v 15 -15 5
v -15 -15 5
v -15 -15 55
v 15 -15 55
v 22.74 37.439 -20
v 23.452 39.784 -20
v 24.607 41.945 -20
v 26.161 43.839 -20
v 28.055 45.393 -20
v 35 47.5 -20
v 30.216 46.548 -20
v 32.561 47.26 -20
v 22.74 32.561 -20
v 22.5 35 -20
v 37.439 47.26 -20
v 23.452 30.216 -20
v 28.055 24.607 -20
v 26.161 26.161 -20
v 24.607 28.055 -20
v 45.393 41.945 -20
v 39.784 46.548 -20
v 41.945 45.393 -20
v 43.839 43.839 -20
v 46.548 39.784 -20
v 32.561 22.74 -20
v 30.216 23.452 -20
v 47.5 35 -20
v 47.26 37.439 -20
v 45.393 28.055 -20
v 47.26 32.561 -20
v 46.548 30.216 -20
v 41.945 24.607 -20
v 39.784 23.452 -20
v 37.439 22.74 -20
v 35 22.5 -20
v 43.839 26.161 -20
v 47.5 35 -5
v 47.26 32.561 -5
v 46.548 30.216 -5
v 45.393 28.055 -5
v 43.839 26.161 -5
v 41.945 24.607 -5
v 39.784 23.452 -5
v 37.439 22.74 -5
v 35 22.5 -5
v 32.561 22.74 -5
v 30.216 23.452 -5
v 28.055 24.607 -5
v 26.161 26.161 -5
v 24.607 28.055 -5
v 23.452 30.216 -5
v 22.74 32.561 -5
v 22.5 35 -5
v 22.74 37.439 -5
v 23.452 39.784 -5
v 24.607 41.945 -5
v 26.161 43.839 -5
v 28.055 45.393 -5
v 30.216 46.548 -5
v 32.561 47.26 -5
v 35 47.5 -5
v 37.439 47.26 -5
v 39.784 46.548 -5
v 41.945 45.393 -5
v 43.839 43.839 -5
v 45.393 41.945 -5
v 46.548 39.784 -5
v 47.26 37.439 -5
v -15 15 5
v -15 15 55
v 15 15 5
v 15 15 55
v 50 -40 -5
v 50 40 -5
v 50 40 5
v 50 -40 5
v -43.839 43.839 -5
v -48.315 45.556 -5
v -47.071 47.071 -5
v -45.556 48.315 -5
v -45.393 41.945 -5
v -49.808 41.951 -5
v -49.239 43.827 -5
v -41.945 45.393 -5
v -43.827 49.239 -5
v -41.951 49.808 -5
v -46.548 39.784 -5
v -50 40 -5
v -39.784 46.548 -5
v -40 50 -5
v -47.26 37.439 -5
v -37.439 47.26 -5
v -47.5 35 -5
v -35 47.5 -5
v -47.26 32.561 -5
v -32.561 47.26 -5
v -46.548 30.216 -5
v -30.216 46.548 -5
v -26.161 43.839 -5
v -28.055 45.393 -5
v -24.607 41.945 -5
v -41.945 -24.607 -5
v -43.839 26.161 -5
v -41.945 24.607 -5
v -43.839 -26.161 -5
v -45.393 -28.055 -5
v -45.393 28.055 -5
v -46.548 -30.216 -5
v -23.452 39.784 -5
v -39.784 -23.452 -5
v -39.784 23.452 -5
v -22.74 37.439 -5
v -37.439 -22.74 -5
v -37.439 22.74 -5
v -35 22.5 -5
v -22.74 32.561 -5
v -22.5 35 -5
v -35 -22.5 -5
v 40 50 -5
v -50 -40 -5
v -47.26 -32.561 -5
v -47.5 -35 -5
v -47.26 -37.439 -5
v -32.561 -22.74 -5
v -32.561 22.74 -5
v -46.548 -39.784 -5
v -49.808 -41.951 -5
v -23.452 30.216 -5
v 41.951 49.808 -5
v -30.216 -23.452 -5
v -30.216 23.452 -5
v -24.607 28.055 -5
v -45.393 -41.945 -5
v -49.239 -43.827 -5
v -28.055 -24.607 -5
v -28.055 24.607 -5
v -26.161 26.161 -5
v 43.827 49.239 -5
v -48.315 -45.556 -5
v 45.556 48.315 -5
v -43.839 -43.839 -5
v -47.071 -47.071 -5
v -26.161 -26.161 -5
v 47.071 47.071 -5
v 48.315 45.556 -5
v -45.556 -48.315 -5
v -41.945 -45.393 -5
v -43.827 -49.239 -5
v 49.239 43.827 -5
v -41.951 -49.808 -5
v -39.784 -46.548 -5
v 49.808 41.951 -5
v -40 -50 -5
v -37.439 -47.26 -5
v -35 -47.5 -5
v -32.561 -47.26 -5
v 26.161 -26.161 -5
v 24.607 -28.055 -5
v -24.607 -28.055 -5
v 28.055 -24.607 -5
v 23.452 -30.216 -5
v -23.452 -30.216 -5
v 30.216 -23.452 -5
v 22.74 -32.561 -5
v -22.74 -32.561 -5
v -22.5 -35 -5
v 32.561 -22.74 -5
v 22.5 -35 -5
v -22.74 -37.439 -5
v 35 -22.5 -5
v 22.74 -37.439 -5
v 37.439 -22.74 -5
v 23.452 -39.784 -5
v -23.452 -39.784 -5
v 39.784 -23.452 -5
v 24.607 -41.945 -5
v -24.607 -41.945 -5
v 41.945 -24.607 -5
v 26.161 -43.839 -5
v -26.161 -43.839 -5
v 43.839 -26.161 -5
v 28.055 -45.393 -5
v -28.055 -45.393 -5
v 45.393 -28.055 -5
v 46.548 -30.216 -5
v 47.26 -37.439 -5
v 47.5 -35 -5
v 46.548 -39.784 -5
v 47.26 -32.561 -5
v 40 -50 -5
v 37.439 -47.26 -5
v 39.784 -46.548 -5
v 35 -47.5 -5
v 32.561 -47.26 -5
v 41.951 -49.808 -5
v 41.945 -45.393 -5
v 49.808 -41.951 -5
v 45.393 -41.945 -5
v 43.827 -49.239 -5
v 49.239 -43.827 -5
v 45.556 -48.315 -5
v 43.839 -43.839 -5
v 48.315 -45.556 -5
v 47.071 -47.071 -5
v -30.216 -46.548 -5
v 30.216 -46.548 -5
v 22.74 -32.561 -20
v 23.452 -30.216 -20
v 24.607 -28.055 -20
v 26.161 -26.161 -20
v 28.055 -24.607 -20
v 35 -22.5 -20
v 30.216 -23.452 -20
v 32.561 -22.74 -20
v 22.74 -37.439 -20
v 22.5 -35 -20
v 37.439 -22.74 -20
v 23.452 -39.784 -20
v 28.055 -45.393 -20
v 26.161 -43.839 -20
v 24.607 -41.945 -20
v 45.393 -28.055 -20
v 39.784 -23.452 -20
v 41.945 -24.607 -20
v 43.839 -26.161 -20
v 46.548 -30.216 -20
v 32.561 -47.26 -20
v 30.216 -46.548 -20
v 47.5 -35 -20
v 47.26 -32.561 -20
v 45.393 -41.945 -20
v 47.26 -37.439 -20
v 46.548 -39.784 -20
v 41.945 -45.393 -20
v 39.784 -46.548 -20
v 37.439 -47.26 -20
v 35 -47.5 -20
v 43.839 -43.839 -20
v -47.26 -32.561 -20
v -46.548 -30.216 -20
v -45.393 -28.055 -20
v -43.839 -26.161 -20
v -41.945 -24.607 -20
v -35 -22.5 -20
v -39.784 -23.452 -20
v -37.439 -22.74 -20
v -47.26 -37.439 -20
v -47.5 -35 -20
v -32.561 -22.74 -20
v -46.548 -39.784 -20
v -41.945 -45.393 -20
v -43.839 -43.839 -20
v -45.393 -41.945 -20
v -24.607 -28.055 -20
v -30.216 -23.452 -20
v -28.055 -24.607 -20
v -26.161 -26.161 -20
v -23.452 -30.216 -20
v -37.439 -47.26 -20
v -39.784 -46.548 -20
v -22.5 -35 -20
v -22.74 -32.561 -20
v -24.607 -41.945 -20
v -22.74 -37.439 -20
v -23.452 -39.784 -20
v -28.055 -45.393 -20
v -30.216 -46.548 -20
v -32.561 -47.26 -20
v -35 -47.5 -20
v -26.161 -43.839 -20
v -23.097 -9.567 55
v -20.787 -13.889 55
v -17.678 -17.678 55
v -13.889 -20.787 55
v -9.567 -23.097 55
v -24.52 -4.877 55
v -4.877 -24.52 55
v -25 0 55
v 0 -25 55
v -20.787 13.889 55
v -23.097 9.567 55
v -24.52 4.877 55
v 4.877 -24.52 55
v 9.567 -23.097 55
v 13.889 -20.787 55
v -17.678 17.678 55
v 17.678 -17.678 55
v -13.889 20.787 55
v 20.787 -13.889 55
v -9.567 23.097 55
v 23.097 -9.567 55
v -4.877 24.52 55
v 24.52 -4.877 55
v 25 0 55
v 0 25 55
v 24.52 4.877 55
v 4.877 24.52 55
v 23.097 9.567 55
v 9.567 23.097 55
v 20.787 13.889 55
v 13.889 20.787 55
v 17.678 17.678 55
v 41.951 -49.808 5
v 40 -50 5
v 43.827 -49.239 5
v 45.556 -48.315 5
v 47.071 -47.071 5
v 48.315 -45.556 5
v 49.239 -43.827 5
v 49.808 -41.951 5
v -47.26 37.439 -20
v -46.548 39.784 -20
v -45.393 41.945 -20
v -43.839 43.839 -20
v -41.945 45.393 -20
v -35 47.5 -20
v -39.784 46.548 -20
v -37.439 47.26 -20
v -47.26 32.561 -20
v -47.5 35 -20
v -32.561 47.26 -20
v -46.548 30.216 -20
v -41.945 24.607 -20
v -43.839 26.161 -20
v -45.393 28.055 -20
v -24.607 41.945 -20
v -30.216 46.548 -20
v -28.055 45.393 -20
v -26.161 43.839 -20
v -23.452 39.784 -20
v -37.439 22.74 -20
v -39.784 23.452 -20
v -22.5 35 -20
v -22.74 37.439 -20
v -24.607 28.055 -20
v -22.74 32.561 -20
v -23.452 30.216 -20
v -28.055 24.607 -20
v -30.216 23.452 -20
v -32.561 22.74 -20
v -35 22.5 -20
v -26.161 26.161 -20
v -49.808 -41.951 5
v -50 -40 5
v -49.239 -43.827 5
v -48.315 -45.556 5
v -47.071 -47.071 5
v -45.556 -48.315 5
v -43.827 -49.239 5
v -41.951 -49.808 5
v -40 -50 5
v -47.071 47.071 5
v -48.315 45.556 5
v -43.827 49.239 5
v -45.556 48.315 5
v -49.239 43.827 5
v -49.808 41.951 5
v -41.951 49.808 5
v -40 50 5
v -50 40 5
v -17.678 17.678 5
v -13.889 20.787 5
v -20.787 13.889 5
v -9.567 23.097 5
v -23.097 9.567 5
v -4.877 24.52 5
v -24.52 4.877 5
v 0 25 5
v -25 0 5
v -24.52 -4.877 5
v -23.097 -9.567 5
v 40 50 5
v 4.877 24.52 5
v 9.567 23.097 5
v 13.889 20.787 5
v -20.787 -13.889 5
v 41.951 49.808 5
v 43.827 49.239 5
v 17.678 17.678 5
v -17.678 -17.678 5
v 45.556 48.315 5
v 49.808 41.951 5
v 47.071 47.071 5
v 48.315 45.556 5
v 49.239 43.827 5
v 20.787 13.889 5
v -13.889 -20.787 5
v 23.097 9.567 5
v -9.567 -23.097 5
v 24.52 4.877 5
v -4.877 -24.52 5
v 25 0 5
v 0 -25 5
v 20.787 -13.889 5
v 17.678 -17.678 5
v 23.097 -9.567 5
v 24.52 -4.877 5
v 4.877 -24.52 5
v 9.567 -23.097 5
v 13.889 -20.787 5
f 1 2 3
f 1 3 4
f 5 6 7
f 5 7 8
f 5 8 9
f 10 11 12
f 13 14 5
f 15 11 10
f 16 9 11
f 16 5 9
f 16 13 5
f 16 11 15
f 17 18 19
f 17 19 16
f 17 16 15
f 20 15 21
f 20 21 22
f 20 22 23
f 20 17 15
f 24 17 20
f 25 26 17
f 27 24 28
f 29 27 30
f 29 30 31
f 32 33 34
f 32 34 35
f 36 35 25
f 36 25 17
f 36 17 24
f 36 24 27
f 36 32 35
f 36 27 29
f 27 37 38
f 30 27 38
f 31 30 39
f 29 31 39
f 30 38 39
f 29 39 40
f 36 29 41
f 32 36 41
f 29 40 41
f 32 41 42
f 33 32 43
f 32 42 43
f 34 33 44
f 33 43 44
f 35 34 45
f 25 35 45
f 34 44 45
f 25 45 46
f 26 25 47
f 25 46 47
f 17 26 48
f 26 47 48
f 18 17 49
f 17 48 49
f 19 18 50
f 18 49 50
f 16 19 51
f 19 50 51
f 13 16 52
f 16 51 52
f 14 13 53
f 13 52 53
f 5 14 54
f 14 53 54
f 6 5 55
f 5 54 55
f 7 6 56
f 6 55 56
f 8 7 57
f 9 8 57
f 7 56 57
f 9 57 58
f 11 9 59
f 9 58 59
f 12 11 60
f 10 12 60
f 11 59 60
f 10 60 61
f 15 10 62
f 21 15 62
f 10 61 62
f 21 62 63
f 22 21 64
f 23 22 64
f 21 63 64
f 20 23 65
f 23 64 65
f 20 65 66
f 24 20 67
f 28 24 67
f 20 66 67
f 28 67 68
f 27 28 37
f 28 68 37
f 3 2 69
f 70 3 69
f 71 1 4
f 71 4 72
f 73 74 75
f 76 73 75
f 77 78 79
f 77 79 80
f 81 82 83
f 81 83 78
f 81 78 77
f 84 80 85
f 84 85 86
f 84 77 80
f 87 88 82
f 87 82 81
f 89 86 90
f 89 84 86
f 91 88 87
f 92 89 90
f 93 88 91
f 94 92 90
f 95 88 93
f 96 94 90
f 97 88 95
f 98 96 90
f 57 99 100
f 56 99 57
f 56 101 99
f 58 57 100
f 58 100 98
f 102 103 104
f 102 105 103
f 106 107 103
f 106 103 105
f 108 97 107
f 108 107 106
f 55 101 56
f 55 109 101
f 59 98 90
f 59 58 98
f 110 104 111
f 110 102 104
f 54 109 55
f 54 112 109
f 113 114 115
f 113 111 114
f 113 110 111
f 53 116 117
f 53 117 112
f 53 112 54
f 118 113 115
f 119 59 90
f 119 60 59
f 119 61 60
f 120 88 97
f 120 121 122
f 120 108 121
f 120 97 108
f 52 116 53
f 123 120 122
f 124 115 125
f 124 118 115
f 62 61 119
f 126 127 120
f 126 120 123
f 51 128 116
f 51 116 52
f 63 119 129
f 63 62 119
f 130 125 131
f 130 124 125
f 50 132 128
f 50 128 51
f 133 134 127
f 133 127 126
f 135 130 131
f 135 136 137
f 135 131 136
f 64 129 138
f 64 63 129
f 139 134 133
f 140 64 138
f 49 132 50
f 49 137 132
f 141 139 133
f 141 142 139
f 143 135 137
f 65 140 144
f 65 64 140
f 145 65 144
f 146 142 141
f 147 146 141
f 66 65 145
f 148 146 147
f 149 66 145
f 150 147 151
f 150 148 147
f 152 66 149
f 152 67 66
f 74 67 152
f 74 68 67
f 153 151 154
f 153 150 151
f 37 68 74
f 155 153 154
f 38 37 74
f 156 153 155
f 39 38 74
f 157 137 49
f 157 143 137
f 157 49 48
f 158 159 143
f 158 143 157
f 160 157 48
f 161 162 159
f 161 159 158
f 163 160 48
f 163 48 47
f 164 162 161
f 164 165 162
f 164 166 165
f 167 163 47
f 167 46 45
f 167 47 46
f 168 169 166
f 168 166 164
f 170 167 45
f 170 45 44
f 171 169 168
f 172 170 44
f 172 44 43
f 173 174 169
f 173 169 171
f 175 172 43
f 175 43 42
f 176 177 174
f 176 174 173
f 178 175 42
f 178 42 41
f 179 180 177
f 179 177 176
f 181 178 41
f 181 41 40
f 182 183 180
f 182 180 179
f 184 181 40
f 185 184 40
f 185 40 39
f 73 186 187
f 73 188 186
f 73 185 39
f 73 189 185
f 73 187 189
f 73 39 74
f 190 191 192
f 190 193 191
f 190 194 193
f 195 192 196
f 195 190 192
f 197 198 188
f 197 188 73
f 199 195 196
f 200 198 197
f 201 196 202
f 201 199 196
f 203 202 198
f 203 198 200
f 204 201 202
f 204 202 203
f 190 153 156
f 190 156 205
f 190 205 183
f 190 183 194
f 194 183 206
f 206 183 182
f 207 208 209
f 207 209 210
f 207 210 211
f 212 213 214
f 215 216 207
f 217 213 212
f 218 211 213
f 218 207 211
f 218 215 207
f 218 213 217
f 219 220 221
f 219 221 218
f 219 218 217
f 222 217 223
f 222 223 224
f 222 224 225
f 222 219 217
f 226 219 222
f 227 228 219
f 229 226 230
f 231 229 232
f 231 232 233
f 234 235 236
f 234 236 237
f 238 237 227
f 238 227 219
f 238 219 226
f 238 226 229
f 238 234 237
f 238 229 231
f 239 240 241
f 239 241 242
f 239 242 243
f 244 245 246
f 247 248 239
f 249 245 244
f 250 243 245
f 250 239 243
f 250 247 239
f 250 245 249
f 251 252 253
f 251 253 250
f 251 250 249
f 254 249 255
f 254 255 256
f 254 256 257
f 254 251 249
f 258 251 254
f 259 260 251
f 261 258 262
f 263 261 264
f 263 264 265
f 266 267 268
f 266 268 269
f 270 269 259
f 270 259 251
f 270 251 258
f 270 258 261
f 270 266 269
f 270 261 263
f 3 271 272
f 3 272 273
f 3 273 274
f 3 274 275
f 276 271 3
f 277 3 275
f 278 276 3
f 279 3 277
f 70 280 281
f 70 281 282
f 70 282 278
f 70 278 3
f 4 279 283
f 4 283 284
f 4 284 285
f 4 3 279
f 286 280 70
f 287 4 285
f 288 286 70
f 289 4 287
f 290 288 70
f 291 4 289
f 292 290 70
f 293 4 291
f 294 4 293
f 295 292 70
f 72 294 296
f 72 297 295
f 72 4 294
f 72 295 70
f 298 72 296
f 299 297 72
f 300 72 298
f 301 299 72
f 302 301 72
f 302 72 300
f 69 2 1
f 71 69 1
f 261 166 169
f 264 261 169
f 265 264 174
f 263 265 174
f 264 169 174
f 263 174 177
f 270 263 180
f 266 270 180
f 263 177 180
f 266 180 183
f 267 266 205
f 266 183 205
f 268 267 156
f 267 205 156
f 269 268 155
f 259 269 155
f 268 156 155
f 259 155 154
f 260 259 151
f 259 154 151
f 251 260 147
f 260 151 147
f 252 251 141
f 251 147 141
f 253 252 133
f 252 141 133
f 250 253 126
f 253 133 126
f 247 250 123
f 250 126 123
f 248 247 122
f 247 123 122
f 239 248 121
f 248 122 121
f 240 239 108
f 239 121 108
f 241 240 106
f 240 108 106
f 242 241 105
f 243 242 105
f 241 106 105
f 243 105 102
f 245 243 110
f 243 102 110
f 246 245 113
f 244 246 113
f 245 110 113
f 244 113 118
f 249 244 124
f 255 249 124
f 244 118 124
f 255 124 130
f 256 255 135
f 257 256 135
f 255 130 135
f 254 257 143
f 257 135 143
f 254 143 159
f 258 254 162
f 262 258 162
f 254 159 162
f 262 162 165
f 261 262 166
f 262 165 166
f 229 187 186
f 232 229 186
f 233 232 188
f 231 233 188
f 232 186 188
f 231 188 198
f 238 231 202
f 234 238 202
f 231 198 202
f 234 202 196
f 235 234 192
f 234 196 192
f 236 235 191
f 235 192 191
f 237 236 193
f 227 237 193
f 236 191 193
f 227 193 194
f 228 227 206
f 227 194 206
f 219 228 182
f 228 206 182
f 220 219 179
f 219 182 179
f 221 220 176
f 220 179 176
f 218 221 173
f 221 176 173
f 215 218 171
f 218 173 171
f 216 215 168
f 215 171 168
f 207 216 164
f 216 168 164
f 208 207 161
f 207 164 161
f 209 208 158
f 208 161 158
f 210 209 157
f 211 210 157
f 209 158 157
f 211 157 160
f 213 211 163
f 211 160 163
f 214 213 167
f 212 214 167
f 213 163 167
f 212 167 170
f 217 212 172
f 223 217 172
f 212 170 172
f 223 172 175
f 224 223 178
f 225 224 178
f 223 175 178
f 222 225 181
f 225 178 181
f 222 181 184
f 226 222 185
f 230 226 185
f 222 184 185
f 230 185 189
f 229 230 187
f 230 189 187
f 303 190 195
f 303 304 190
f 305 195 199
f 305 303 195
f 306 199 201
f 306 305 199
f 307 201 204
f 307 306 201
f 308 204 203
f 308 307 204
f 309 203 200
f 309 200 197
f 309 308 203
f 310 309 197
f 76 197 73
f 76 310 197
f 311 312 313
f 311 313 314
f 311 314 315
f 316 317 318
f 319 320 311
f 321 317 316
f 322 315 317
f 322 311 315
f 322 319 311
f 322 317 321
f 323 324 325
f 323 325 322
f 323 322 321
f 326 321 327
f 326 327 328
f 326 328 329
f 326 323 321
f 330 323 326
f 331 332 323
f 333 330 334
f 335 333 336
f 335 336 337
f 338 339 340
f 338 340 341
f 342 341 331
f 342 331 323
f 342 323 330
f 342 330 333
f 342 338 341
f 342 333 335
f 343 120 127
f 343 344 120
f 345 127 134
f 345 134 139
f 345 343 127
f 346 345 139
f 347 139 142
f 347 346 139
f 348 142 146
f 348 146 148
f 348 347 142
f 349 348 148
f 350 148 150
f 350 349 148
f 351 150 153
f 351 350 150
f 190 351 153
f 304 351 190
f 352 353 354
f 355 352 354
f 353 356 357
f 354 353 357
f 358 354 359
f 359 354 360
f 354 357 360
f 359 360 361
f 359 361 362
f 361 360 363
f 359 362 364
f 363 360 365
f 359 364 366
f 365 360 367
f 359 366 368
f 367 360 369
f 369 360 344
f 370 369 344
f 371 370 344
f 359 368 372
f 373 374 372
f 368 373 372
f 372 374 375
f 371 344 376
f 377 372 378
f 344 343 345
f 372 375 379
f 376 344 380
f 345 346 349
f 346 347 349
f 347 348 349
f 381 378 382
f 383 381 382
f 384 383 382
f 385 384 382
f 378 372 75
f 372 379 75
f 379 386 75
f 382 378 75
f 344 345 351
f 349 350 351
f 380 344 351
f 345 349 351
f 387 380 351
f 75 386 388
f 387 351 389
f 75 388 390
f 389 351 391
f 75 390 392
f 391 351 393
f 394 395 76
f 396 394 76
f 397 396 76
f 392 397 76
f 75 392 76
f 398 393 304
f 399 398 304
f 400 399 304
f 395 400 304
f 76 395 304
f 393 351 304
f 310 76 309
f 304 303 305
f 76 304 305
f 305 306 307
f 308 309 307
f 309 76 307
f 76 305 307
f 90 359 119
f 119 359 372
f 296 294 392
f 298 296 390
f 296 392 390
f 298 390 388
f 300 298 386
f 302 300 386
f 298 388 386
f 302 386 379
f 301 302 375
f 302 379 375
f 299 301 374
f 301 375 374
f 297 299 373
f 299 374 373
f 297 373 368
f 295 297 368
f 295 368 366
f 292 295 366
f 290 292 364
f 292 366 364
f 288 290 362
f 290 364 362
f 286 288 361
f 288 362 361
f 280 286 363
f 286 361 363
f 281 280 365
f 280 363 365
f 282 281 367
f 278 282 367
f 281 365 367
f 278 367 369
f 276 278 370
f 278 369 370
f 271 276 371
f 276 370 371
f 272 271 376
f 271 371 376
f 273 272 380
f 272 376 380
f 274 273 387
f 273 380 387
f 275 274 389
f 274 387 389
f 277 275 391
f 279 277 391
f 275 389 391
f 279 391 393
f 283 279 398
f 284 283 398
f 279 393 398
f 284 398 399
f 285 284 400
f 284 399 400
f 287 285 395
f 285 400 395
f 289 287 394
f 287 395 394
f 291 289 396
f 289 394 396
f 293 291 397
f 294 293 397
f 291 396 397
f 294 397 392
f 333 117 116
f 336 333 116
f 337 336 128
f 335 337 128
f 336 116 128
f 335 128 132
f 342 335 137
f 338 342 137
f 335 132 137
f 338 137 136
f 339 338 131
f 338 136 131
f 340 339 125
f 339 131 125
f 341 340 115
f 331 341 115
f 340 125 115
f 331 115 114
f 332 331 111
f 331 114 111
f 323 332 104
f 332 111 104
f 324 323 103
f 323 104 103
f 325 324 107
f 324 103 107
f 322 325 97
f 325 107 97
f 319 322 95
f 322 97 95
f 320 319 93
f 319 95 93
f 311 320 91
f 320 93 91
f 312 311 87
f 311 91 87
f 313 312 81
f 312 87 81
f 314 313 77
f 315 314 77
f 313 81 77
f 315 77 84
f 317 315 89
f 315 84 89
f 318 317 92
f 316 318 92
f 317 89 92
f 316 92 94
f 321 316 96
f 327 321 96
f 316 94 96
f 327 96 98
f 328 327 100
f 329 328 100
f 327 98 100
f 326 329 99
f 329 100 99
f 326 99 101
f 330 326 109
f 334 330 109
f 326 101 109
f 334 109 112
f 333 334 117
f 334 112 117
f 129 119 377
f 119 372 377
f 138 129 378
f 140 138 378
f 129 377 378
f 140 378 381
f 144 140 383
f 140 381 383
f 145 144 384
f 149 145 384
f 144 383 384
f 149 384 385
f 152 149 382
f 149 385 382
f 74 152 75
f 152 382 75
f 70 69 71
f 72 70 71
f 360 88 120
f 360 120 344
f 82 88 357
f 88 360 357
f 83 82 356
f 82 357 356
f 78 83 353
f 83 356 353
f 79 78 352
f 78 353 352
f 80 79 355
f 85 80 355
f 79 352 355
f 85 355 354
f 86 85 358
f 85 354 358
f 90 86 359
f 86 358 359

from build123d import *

# Parameters (mm, degrees)
F0_W     = 100
F0_H     = 10
F1_DEPTH = 50
F2_R     = 12.5
F3_DEPTH = 15
F4_R     = 10
F5_R     = 25
F5_W     = 30
F5_H     = 30
F6_DEPTH = 50


with BuildPart() as f1:
    # F0 (on Front) → F1 (new body, symmetric)
    with BuildSketch(Plane.XZ):
        Rectangle(F0_W, F0_H)
    extrude(amount=F1_DEPTH, both=True)

    # F2 (on face) → F3 (join)
    with BuildSketch(Plane(origin=(0, 0, -5), x_dir=(1, 0, 0), z_dir=(0, 0, -1))):
        with Locations((35, 35)):
            Circle(F2_R)
        with Locations((35, -35)):
            Circle(F2_R)
        with Locations((-35, -35)):
            Circle(F2_R)
        with Locations((-35, 35)):
            Circle(F2_R)
    extrude(amount=F3_DEPTH)

    # F4
    f4_edges = [f1.edges().sort_by_distance(p)[0] for p in [
        (-50, -50, 0),
        (50, -50, 0),
        (50, 50, 0),
        (-50, 50, 0),
    ]]
    fillet(f4_edges, radius=F4_R)

    # F5 (on face) → F6 (join)
    with BuildSketch(Plane.XY.offset(5)):
        Circle(F5_R)
        Rectangle(F5_W, F5_H, mode=Mode.SUBTRACT)
    extrude(amount=F6_DEPTH)


solid = f1.part
